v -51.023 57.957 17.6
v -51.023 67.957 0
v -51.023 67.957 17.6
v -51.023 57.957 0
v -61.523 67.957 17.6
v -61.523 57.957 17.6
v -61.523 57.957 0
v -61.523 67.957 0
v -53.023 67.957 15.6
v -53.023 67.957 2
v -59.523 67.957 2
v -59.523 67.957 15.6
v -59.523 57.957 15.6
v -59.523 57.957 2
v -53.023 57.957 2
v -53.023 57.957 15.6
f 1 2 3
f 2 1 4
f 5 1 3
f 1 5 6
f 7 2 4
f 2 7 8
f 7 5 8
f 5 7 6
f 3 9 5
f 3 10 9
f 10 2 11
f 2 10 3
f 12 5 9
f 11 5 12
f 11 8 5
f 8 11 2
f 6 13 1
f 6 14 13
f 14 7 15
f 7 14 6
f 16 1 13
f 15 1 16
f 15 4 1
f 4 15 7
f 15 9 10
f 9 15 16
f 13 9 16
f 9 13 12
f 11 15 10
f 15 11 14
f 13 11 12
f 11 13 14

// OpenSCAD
difference () {
  translate ([-56.27338164769888, 62.9565168793326, 8.8]) {
    cube ([10.5, 10.0, 17.6], center=true);
  }
  translate ([-56.27338164769888, 62.9565168793326, 8.8]) {
    cube ([6.5, 10.0, 13.6], center=true);
  }
}
